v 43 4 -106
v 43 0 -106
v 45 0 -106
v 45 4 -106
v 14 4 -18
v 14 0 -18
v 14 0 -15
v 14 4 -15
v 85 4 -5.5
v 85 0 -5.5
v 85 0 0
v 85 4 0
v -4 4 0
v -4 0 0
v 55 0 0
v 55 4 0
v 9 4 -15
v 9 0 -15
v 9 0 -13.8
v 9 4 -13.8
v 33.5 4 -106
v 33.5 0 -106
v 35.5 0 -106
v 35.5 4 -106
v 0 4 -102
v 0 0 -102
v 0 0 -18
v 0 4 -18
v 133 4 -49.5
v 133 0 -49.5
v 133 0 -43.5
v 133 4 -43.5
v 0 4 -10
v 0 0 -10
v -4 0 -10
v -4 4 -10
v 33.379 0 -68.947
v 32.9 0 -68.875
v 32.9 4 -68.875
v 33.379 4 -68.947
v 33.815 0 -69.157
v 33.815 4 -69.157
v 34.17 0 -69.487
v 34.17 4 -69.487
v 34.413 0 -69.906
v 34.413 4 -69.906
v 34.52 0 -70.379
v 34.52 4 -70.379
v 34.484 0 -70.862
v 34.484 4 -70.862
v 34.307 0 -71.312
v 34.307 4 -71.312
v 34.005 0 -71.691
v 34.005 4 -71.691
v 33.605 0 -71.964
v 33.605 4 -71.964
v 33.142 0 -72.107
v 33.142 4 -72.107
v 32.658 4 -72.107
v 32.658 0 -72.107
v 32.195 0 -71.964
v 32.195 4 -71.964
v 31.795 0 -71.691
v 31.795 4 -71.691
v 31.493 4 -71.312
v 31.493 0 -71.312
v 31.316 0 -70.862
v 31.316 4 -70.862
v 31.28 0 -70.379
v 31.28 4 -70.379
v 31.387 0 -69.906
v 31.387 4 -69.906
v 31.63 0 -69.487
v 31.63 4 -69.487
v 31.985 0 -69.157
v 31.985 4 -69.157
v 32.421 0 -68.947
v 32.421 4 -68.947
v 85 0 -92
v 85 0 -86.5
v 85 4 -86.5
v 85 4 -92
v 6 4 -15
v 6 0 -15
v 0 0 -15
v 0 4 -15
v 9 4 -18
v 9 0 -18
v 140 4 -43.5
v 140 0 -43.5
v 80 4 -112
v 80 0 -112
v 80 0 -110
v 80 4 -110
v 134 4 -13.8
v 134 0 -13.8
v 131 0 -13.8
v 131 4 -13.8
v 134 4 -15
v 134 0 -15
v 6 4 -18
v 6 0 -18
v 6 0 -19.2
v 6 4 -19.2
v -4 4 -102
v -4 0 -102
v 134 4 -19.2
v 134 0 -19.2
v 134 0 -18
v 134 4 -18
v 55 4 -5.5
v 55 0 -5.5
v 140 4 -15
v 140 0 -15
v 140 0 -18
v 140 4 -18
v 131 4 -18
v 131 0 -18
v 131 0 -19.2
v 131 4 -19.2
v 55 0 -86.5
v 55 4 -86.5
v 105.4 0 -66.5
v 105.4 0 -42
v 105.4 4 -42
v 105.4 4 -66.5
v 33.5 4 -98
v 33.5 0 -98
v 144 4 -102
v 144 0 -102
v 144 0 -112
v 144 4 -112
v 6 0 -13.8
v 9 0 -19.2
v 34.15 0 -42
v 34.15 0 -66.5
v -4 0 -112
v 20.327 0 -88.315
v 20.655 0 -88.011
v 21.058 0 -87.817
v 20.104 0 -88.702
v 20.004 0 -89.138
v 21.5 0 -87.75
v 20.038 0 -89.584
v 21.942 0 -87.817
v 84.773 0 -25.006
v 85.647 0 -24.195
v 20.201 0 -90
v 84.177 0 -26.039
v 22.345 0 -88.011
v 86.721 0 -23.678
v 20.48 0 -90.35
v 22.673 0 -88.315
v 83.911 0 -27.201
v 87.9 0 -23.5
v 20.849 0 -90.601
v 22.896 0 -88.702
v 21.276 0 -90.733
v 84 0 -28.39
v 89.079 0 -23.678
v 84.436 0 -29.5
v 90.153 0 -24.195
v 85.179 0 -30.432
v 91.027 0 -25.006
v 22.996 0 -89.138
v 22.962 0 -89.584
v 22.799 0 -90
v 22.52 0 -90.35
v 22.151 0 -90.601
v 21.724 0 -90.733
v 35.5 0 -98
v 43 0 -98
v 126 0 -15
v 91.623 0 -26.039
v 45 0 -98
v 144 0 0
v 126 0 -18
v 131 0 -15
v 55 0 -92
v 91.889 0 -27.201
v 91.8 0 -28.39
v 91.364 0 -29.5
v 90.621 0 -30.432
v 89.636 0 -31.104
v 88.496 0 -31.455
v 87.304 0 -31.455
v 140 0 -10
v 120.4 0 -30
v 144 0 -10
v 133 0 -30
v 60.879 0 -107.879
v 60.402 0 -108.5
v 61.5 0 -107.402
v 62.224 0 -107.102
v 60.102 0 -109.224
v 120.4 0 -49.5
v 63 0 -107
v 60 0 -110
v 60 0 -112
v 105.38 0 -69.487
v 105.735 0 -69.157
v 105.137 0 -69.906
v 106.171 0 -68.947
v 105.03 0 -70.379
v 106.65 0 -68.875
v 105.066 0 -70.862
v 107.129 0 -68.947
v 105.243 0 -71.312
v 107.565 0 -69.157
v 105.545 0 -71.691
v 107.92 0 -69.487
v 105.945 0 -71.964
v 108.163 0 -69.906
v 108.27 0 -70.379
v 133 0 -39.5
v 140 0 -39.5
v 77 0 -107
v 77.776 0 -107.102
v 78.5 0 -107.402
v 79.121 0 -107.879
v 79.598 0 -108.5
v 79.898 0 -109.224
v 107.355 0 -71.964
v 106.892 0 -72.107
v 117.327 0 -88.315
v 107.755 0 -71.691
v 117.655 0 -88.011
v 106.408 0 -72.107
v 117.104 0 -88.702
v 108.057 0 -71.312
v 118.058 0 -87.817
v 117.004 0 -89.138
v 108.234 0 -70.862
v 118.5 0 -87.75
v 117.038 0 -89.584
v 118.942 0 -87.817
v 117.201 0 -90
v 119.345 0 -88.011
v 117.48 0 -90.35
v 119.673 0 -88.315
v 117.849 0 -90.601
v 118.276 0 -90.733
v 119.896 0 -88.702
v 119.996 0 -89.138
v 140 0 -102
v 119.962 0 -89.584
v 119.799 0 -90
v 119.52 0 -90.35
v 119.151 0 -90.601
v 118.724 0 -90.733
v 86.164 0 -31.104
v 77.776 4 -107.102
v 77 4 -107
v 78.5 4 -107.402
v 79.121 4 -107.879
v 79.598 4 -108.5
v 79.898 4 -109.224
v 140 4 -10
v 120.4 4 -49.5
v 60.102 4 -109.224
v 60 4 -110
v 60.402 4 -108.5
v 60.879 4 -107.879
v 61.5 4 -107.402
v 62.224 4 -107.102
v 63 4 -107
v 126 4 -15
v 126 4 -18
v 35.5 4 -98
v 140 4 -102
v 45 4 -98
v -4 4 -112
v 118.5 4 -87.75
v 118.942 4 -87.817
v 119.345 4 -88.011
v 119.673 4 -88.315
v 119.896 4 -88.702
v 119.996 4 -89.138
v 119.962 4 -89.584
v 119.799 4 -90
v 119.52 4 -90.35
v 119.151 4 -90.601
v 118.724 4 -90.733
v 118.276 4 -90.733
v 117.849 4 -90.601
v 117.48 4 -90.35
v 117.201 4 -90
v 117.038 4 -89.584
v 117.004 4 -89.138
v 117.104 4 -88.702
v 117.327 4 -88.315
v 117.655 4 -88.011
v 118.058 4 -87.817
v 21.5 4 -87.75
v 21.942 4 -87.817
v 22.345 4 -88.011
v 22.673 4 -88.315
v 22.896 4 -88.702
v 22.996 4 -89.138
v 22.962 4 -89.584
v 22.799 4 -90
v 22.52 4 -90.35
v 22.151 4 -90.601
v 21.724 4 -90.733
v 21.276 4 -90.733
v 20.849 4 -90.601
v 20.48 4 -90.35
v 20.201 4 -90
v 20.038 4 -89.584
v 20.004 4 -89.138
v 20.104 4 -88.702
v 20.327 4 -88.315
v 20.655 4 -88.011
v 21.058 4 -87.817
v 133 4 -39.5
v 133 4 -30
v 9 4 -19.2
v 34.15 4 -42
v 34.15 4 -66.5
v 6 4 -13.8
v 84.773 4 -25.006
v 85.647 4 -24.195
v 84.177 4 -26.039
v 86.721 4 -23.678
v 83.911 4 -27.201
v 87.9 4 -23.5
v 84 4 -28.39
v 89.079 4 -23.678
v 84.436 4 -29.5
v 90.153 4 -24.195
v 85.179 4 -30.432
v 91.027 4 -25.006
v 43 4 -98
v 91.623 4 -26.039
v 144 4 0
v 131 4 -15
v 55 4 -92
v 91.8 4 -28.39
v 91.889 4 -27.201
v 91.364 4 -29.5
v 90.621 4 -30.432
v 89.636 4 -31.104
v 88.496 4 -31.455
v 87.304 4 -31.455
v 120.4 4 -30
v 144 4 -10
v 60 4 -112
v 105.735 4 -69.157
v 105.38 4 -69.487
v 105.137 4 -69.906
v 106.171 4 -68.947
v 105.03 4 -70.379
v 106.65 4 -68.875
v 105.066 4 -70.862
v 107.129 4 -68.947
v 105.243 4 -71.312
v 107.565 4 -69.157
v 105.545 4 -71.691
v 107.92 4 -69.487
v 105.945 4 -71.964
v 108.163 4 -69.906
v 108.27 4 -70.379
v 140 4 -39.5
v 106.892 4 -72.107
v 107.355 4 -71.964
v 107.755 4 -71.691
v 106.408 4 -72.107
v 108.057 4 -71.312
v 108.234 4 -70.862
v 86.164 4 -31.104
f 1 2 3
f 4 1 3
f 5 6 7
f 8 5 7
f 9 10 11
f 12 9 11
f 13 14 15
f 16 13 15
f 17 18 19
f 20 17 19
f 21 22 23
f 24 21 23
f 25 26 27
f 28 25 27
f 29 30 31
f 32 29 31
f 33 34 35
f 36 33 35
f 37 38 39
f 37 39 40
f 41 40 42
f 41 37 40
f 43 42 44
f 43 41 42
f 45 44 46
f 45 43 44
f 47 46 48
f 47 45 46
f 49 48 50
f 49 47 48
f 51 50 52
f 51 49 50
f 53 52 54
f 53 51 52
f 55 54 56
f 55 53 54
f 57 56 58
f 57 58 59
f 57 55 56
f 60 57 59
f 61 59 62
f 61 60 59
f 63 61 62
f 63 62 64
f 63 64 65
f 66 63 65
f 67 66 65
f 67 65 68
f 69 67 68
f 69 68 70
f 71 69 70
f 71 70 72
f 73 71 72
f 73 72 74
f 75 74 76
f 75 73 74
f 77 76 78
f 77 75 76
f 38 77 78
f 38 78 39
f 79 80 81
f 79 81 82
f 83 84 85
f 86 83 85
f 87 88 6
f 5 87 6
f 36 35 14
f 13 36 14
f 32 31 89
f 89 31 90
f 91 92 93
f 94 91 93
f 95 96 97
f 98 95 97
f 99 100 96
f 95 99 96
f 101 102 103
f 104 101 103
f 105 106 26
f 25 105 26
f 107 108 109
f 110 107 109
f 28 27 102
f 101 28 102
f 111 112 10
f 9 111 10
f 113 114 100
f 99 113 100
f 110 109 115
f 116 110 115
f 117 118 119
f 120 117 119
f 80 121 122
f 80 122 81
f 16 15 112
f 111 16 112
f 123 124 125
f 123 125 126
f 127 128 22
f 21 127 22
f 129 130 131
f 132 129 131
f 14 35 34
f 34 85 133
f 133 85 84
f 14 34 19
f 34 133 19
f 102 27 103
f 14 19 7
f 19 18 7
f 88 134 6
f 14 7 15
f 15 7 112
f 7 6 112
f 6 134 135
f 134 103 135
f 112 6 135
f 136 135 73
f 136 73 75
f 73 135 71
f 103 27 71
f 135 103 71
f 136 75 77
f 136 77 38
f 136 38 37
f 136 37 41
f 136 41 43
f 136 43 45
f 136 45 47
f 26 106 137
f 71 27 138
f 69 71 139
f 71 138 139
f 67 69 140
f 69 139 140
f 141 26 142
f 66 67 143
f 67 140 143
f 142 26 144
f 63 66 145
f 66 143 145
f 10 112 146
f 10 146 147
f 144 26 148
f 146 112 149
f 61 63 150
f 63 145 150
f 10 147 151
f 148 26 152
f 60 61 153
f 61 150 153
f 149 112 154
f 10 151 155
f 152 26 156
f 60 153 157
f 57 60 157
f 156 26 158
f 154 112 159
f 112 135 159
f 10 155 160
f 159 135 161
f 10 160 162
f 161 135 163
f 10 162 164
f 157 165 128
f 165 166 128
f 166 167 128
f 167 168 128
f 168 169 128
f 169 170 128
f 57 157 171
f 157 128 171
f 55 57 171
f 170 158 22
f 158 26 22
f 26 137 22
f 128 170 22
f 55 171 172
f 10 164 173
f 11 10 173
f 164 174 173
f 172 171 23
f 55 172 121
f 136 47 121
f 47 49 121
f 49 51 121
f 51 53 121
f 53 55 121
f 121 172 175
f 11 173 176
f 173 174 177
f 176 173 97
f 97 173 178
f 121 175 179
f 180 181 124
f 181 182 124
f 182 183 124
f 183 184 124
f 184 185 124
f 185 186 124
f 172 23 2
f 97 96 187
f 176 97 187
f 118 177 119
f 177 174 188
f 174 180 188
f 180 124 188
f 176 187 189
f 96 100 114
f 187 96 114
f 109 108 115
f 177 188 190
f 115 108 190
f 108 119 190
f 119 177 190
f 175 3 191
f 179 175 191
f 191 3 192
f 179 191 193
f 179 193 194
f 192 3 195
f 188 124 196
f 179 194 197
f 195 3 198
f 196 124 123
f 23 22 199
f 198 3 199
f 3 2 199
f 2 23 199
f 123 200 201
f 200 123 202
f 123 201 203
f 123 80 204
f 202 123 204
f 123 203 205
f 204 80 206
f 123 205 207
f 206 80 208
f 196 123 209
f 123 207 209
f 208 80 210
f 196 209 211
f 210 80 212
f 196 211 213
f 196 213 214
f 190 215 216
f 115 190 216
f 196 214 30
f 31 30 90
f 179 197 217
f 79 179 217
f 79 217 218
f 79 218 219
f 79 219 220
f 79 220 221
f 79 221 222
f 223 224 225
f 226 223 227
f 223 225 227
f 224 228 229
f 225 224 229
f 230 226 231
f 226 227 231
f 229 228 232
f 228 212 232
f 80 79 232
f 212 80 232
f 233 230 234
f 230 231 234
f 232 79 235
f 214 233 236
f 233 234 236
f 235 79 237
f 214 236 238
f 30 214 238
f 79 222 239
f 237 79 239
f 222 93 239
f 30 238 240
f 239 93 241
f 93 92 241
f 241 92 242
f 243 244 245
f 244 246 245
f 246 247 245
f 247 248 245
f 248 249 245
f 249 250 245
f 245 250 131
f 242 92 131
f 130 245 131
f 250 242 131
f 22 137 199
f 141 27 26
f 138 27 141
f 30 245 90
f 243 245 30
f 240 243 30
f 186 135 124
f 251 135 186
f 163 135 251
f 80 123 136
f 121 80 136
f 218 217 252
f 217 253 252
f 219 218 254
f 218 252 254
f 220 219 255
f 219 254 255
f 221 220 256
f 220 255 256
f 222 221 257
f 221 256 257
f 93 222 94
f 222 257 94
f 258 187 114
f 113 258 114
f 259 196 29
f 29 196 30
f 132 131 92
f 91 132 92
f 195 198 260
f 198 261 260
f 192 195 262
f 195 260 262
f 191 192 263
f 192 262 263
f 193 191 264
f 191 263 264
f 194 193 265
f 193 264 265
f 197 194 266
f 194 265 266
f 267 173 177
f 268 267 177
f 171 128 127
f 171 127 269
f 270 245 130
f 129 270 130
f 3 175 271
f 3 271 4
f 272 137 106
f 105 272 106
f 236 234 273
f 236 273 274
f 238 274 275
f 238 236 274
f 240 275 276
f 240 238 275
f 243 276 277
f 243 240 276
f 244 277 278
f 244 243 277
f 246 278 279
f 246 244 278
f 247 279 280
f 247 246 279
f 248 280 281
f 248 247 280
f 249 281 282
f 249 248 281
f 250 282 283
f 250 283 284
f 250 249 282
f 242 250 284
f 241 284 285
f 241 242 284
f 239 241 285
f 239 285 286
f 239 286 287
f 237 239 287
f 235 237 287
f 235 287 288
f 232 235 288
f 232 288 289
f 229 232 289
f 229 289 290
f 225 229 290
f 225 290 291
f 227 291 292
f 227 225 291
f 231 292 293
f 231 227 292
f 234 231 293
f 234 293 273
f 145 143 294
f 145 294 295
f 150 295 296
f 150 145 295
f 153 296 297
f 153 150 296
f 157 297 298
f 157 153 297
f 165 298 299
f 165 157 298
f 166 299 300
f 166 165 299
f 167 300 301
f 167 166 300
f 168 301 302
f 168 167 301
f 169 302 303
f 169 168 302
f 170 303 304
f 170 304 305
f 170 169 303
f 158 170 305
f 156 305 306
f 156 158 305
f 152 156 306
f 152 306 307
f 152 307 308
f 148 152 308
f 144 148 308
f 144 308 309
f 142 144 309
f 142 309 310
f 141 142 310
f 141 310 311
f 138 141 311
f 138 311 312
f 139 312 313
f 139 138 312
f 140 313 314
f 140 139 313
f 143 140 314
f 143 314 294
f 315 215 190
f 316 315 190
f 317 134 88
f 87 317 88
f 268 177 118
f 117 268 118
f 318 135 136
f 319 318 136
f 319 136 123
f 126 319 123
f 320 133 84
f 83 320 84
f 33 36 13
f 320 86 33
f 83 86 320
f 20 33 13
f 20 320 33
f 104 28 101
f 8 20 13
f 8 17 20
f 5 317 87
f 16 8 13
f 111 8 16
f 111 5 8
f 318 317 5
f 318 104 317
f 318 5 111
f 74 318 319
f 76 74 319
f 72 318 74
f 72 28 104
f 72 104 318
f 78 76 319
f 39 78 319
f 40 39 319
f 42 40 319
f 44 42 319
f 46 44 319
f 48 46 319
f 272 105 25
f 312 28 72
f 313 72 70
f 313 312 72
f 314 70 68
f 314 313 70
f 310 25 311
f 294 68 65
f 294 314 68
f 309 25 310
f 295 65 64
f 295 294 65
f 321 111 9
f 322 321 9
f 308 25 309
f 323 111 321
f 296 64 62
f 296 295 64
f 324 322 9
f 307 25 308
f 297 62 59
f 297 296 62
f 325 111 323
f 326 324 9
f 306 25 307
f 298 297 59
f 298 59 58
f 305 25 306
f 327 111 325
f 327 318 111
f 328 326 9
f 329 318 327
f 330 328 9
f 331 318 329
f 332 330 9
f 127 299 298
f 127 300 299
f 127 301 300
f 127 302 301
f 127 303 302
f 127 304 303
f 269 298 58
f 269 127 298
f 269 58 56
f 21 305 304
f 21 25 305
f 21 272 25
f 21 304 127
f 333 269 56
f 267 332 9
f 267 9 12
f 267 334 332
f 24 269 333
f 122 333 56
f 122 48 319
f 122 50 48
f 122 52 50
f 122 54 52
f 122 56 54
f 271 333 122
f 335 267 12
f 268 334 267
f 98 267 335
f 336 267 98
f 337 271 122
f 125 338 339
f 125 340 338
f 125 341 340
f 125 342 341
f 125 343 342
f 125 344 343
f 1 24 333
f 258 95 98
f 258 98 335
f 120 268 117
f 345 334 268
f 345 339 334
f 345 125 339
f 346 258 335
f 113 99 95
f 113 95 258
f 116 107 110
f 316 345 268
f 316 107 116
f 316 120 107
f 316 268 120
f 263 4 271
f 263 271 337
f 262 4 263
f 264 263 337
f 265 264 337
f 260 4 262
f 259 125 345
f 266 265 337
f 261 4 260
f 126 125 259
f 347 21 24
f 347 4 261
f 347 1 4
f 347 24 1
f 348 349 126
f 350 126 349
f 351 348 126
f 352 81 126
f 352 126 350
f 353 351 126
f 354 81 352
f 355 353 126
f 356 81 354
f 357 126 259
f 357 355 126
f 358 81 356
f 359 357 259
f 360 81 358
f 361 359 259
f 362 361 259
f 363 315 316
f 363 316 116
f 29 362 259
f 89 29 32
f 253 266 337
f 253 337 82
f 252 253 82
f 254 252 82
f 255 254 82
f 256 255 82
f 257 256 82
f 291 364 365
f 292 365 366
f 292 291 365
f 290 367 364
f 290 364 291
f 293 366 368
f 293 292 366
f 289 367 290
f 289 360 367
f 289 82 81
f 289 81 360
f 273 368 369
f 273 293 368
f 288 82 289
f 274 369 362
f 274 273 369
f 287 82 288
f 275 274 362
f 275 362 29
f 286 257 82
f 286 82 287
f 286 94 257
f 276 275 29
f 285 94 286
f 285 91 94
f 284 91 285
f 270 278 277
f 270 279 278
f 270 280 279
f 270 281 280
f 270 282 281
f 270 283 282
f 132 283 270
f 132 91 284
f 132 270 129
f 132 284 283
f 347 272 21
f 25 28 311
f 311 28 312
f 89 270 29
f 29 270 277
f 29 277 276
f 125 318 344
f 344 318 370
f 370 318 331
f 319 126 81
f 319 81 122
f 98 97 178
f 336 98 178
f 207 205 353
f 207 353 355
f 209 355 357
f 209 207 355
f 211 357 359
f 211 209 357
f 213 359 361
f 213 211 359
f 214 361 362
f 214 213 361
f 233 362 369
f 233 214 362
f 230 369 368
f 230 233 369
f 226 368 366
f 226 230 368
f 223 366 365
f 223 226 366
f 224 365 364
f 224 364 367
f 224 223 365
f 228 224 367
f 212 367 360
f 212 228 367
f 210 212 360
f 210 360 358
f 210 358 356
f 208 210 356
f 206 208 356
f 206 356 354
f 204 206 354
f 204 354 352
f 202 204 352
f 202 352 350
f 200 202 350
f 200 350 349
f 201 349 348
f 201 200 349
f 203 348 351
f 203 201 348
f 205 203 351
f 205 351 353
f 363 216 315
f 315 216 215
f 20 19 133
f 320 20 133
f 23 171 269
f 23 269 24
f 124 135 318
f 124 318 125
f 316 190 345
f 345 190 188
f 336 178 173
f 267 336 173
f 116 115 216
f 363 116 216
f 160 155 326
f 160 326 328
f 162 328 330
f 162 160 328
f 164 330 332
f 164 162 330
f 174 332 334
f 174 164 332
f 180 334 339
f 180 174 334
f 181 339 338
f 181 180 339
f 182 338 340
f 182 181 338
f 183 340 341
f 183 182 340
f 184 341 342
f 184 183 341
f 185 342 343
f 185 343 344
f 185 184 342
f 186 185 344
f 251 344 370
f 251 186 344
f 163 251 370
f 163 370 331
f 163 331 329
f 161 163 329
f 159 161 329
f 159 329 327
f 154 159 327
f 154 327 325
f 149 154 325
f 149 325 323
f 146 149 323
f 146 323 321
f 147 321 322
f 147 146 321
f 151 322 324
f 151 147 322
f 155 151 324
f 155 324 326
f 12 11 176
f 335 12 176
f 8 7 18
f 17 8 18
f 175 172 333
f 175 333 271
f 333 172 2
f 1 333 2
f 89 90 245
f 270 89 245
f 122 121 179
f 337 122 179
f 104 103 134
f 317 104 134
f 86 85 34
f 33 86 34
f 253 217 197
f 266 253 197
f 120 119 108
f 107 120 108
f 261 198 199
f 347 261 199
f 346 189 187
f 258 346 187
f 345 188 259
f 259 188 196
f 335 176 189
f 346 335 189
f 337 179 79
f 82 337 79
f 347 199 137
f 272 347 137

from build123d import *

# Parameters (mm, degrees)
SKETCH1_R           = 1.5
SKETCH1_R_2         = 4
SKETCH1_R_3         = 1.625
SKETCH1_W           = 30
SKETCH1_H           = 5.5
SKETCH1_W_2         = 2
SKETCH1_H_2         = 8
SKETCH1_W_3         = 71.25
SKETCH1_H_3         = 24.5
BOSS_EXTRUDE1_DEPTH = 4
FILLET1_R           = 3
FILLET2_R           = 3


with BuildPart() as part:
    # Sketch1 → Boss-Extrude1 (new body)
    with BuildSketch(Plane(origin=(0, 0, 0), x_dir=(1, 0, 0), z_dir=(0, 1, 0))):
        Polygon((85, 0), (140, 0), (144, 0), (144, 10), (140, 10), (140, 15), (134, 15), (134, 13.8), (131, 13.8), (131, 15), (126, 15), (126, 18), (131, 18), (131, 19.2), (134, 19.2), (134, 18), (140, 18), (140, 39.5), (133, 39.5), (133, 30), (120.4, 30), (120.4, 49.5), (133, 49.5), (133, 43.5), (140, 43.5), (140, 102), (144, 102), (144, 112), (140, 112), (80, 112), (80, 107), (60, 107), (60, 112), (0, 112), (-4, 112), (-4, 102), (0, 102), (0, 18), (6, 18), (6, 19.2), (9, 19.2), (9, 18), (14, 18), (14, 15), (9, 15), (9, 13.8), (6, 13.8), (6, 15), (0, 15), (0, 10), (-4, 10), (-4, 0), (0, 0), (55, 0), (55, 5.5), (85, 5.5), align=None)
        with Locations(Location((21.5, 89.25, 0), (0, 0, 270))):
            Circle(SKETCH1_R, mode=Mode.SUBTRACT)
        with Locations(Location((118.5, 89.25, 0), (0, 0, 270))):
            Circle(SKETCH1_R, mode=Mode.SUBTRACT)
        with Locations(Location((87.9, 27.5, 0), (0, 0, 270))):
            Circle(SKETCH1_R_2, mode=Mode.SUBTRACT)
        with Locations(Location((32.9, 70.5, 0), (0, 0, 270))):
            Circle(SKETCH1_R_3, mode=Mode.SUBTRACT)
        with Locations(Location((106.65, 70.5, 0), (0, 0, 270))):
            Circle(SKETCH1_R_3, mode=Mode.SUBTRACT)
        with Locations((70, 89.25)):
            Rectangle(SKETCH1_W, SKETCH1_H, mode=Mode.SUBTRACT)
        with Locations((34.5, 102)):
            Rectangle(SKETCH1_W_2, SKETCH1_H_2, mode=Mode.SUBTRACT)
        with Locations((44, 102)):
            Rectangle(SKETCH1_W_2, SKETCH1_H_2, mode=Mode.SUBTRACT)
        with Locations((69.775, 54.25)):
            Rectangle(SKETCH1_W_3, SKETCH1_H_3, mode=Mode.SUBTRACT)
    extrude(amount=BOSS_EXTRUDE1_DEPTH)

    # Fillet1
    fillet1_edges = [part.edges().sort_by_distance(p)[0] for p in [
        (60, 2, -107),
    ]]
    fillet(fillet1_edges, radius=FILLET1_R)

    # Fillet2
    fillet2_edges = [part.edges().sort_by_distance(p)[0] for p in [
        (80, 2, -107),
    ]]
    fillet(fillet2_edges, radius=FILLET2_R)


solid = part.part
